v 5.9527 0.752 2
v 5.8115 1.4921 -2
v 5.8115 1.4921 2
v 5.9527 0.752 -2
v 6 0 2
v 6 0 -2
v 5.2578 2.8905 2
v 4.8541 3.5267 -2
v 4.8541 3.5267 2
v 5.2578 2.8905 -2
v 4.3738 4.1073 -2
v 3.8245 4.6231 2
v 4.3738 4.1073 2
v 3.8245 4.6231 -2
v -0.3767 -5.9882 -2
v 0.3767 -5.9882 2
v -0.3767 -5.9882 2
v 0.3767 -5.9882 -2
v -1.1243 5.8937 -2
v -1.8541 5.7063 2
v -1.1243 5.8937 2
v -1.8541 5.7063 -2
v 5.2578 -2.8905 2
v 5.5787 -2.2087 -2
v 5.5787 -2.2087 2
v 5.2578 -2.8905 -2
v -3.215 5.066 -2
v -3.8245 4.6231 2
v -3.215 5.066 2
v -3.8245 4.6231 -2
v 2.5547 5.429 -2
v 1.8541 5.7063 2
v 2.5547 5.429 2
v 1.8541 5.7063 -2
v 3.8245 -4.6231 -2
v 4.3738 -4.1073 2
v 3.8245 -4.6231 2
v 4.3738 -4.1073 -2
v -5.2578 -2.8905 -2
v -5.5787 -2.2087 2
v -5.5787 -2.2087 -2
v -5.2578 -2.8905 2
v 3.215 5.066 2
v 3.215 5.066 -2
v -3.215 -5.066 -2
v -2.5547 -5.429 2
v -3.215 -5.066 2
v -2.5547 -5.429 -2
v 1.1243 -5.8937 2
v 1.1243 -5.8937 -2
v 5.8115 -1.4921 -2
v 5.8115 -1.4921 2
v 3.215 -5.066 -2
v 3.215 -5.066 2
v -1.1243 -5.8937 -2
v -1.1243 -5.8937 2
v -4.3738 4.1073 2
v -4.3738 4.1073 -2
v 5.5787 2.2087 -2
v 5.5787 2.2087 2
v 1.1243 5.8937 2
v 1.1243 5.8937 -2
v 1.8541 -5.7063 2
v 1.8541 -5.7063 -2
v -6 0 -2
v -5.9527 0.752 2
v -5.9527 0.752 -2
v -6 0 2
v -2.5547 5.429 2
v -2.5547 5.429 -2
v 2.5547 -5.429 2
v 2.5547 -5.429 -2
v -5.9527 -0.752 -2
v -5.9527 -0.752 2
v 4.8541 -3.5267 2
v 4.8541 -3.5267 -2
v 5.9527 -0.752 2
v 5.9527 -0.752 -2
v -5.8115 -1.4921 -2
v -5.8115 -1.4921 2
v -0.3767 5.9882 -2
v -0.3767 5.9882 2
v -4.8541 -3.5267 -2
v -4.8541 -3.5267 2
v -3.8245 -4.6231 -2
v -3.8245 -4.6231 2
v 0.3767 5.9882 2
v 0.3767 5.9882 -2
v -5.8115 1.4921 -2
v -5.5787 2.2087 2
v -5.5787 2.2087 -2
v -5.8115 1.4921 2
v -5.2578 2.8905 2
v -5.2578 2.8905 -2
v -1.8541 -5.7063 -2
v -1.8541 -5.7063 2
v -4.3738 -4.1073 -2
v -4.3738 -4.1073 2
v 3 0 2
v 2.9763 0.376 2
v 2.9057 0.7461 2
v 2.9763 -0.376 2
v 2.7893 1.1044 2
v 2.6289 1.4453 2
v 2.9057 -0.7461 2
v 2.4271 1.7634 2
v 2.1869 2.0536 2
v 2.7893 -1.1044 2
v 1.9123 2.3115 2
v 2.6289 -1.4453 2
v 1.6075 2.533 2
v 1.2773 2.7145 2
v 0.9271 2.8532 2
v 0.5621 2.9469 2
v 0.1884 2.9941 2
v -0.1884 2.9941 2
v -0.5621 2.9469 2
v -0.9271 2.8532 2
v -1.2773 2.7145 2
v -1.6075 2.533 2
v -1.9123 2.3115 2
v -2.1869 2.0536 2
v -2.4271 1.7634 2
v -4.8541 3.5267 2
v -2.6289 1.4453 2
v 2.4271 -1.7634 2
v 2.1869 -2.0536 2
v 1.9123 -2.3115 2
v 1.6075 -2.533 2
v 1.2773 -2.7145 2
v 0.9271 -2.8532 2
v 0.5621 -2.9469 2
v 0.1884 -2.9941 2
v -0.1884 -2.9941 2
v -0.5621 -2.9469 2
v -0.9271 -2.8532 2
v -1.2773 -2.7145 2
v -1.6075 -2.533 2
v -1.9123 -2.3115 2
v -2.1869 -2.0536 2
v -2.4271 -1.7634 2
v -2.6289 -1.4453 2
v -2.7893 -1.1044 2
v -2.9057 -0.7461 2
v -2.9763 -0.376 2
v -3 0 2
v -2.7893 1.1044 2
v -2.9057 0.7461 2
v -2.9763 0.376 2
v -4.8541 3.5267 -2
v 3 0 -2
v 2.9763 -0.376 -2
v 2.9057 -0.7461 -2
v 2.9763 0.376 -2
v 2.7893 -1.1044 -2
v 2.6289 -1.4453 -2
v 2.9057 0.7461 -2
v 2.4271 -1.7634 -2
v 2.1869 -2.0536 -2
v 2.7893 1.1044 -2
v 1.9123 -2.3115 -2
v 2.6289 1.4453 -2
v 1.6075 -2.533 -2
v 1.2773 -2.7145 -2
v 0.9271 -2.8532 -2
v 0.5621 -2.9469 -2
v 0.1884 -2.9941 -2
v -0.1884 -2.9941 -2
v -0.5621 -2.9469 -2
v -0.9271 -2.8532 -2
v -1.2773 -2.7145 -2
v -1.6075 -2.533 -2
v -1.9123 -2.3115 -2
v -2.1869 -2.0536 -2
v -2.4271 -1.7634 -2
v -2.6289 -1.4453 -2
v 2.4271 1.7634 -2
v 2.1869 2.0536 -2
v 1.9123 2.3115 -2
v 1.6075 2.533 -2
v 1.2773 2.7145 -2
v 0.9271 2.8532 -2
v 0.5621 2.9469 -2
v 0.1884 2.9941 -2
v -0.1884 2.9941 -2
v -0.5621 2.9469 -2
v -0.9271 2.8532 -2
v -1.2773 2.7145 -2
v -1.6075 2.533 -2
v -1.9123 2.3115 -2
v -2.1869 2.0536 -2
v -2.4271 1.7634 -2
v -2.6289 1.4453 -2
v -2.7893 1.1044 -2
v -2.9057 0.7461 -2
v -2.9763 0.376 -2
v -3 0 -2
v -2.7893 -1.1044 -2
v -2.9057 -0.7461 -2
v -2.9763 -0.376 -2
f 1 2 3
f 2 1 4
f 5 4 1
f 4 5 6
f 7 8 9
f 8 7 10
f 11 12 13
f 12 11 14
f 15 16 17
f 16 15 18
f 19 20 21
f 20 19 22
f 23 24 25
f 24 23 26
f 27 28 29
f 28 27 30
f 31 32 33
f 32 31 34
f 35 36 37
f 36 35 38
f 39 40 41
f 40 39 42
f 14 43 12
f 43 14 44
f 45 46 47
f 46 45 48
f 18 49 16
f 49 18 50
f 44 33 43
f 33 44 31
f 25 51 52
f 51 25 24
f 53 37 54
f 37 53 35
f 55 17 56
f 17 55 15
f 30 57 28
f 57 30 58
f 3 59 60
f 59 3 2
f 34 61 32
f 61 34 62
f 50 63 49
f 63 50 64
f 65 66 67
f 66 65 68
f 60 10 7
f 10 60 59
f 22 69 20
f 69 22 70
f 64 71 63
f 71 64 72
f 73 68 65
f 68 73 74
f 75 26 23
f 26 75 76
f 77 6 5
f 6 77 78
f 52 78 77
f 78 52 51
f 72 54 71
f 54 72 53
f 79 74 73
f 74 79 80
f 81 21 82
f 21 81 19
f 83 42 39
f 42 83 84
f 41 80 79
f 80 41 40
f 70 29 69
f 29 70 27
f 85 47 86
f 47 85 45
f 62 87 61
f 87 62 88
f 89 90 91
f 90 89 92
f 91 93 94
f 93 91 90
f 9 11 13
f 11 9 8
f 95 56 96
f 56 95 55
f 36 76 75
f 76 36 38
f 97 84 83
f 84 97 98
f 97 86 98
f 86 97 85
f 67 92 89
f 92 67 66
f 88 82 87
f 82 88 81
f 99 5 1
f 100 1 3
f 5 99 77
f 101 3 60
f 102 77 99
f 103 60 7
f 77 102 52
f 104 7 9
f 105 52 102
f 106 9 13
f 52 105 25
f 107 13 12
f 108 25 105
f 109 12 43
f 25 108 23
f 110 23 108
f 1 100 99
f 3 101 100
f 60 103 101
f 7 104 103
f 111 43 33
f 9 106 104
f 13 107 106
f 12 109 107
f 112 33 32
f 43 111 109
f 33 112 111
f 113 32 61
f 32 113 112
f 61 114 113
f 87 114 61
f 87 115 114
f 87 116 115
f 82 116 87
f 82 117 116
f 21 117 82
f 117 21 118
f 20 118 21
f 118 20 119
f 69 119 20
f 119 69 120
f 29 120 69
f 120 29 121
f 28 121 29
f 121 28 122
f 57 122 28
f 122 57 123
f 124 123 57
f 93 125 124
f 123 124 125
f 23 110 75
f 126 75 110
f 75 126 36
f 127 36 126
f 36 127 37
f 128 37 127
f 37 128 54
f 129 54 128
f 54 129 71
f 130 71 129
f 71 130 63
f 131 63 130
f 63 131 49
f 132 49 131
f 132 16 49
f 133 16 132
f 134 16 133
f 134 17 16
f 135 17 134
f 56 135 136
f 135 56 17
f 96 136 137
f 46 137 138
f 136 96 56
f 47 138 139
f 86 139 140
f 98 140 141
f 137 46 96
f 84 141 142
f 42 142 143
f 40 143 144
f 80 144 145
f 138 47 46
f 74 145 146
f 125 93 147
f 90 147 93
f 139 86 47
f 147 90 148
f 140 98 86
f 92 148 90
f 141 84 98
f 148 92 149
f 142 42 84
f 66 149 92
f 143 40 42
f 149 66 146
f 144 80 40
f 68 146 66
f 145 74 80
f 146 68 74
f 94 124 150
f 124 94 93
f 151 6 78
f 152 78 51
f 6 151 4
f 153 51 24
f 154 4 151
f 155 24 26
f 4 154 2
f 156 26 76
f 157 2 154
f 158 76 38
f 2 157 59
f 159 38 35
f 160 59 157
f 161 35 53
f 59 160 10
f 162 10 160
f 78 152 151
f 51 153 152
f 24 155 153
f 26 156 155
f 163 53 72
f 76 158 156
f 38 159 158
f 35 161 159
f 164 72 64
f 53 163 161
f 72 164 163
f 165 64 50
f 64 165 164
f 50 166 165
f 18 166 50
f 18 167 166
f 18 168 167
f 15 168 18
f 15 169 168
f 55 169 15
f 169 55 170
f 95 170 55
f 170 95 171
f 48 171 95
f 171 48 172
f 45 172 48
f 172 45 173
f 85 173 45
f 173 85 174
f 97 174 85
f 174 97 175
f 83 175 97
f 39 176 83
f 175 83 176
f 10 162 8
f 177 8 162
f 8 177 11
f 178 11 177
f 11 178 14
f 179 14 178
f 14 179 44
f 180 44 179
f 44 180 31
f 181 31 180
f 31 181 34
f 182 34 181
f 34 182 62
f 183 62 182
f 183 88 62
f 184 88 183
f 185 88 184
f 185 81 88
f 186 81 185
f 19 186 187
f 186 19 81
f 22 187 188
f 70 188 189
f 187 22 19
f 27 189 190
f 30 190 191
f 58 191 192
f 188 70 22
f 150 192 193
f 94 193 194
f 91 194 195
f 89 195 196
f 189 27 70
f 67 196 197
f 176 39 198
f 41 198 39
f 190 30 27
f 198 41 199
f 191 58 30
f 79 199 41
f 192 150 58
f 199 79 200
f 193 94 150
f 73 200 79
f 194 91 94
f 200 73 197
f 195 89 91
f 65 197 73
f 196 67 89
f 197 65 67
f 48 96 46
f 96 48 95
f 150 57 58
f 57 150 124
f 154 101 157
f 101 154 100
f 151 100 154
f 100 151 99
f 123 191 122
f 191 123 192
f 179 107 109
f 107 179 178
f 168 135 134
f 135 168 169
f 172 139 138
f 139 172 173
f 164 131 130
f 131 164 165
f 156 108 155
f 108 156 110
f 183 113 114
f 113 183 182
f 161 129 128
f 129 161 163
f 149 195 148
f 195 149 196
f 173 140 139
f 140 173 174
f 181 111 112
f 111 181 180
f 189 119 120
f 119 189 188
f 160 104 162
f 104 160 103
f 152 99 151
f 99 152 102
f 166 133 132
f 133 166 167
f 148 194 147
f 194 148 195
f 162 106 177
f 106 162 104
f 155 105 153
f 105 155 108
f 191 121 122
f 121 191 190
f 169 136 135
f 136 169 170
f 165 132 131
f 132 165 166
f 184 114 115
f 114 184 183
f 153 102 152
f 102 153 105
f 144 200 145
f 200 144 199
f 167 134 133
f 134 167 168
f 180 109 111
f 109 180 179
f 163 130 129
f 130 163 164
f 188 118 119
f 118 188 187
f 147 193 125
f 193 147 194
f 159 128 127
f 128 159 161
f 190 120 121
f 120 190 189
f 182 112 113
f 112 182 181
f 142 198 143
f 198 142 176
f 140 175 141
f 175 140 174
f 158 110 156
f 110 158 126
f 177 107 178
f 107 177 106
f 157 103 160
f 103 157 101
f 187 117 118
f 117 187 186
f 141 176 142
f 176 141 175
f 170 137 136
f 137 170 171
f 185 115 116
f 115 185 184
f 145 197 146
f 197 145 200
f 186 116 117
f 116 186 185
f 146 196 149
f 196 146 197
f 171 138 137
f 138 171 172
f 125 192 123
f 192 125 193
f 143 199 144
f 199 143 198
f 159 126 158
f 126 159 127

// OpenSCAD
$fn = 50;


difference() {
	union() {
		translate(v = [0, 0, -2.0000000000]) {
			cylinder(h = 4, r = 6.0000000000);
		}
	}
	union() {
		translate(v = [0, 0, -100.0000000000]) {
			cylinder(h = 200, r = 3.0000000000);
		}
	}
}
